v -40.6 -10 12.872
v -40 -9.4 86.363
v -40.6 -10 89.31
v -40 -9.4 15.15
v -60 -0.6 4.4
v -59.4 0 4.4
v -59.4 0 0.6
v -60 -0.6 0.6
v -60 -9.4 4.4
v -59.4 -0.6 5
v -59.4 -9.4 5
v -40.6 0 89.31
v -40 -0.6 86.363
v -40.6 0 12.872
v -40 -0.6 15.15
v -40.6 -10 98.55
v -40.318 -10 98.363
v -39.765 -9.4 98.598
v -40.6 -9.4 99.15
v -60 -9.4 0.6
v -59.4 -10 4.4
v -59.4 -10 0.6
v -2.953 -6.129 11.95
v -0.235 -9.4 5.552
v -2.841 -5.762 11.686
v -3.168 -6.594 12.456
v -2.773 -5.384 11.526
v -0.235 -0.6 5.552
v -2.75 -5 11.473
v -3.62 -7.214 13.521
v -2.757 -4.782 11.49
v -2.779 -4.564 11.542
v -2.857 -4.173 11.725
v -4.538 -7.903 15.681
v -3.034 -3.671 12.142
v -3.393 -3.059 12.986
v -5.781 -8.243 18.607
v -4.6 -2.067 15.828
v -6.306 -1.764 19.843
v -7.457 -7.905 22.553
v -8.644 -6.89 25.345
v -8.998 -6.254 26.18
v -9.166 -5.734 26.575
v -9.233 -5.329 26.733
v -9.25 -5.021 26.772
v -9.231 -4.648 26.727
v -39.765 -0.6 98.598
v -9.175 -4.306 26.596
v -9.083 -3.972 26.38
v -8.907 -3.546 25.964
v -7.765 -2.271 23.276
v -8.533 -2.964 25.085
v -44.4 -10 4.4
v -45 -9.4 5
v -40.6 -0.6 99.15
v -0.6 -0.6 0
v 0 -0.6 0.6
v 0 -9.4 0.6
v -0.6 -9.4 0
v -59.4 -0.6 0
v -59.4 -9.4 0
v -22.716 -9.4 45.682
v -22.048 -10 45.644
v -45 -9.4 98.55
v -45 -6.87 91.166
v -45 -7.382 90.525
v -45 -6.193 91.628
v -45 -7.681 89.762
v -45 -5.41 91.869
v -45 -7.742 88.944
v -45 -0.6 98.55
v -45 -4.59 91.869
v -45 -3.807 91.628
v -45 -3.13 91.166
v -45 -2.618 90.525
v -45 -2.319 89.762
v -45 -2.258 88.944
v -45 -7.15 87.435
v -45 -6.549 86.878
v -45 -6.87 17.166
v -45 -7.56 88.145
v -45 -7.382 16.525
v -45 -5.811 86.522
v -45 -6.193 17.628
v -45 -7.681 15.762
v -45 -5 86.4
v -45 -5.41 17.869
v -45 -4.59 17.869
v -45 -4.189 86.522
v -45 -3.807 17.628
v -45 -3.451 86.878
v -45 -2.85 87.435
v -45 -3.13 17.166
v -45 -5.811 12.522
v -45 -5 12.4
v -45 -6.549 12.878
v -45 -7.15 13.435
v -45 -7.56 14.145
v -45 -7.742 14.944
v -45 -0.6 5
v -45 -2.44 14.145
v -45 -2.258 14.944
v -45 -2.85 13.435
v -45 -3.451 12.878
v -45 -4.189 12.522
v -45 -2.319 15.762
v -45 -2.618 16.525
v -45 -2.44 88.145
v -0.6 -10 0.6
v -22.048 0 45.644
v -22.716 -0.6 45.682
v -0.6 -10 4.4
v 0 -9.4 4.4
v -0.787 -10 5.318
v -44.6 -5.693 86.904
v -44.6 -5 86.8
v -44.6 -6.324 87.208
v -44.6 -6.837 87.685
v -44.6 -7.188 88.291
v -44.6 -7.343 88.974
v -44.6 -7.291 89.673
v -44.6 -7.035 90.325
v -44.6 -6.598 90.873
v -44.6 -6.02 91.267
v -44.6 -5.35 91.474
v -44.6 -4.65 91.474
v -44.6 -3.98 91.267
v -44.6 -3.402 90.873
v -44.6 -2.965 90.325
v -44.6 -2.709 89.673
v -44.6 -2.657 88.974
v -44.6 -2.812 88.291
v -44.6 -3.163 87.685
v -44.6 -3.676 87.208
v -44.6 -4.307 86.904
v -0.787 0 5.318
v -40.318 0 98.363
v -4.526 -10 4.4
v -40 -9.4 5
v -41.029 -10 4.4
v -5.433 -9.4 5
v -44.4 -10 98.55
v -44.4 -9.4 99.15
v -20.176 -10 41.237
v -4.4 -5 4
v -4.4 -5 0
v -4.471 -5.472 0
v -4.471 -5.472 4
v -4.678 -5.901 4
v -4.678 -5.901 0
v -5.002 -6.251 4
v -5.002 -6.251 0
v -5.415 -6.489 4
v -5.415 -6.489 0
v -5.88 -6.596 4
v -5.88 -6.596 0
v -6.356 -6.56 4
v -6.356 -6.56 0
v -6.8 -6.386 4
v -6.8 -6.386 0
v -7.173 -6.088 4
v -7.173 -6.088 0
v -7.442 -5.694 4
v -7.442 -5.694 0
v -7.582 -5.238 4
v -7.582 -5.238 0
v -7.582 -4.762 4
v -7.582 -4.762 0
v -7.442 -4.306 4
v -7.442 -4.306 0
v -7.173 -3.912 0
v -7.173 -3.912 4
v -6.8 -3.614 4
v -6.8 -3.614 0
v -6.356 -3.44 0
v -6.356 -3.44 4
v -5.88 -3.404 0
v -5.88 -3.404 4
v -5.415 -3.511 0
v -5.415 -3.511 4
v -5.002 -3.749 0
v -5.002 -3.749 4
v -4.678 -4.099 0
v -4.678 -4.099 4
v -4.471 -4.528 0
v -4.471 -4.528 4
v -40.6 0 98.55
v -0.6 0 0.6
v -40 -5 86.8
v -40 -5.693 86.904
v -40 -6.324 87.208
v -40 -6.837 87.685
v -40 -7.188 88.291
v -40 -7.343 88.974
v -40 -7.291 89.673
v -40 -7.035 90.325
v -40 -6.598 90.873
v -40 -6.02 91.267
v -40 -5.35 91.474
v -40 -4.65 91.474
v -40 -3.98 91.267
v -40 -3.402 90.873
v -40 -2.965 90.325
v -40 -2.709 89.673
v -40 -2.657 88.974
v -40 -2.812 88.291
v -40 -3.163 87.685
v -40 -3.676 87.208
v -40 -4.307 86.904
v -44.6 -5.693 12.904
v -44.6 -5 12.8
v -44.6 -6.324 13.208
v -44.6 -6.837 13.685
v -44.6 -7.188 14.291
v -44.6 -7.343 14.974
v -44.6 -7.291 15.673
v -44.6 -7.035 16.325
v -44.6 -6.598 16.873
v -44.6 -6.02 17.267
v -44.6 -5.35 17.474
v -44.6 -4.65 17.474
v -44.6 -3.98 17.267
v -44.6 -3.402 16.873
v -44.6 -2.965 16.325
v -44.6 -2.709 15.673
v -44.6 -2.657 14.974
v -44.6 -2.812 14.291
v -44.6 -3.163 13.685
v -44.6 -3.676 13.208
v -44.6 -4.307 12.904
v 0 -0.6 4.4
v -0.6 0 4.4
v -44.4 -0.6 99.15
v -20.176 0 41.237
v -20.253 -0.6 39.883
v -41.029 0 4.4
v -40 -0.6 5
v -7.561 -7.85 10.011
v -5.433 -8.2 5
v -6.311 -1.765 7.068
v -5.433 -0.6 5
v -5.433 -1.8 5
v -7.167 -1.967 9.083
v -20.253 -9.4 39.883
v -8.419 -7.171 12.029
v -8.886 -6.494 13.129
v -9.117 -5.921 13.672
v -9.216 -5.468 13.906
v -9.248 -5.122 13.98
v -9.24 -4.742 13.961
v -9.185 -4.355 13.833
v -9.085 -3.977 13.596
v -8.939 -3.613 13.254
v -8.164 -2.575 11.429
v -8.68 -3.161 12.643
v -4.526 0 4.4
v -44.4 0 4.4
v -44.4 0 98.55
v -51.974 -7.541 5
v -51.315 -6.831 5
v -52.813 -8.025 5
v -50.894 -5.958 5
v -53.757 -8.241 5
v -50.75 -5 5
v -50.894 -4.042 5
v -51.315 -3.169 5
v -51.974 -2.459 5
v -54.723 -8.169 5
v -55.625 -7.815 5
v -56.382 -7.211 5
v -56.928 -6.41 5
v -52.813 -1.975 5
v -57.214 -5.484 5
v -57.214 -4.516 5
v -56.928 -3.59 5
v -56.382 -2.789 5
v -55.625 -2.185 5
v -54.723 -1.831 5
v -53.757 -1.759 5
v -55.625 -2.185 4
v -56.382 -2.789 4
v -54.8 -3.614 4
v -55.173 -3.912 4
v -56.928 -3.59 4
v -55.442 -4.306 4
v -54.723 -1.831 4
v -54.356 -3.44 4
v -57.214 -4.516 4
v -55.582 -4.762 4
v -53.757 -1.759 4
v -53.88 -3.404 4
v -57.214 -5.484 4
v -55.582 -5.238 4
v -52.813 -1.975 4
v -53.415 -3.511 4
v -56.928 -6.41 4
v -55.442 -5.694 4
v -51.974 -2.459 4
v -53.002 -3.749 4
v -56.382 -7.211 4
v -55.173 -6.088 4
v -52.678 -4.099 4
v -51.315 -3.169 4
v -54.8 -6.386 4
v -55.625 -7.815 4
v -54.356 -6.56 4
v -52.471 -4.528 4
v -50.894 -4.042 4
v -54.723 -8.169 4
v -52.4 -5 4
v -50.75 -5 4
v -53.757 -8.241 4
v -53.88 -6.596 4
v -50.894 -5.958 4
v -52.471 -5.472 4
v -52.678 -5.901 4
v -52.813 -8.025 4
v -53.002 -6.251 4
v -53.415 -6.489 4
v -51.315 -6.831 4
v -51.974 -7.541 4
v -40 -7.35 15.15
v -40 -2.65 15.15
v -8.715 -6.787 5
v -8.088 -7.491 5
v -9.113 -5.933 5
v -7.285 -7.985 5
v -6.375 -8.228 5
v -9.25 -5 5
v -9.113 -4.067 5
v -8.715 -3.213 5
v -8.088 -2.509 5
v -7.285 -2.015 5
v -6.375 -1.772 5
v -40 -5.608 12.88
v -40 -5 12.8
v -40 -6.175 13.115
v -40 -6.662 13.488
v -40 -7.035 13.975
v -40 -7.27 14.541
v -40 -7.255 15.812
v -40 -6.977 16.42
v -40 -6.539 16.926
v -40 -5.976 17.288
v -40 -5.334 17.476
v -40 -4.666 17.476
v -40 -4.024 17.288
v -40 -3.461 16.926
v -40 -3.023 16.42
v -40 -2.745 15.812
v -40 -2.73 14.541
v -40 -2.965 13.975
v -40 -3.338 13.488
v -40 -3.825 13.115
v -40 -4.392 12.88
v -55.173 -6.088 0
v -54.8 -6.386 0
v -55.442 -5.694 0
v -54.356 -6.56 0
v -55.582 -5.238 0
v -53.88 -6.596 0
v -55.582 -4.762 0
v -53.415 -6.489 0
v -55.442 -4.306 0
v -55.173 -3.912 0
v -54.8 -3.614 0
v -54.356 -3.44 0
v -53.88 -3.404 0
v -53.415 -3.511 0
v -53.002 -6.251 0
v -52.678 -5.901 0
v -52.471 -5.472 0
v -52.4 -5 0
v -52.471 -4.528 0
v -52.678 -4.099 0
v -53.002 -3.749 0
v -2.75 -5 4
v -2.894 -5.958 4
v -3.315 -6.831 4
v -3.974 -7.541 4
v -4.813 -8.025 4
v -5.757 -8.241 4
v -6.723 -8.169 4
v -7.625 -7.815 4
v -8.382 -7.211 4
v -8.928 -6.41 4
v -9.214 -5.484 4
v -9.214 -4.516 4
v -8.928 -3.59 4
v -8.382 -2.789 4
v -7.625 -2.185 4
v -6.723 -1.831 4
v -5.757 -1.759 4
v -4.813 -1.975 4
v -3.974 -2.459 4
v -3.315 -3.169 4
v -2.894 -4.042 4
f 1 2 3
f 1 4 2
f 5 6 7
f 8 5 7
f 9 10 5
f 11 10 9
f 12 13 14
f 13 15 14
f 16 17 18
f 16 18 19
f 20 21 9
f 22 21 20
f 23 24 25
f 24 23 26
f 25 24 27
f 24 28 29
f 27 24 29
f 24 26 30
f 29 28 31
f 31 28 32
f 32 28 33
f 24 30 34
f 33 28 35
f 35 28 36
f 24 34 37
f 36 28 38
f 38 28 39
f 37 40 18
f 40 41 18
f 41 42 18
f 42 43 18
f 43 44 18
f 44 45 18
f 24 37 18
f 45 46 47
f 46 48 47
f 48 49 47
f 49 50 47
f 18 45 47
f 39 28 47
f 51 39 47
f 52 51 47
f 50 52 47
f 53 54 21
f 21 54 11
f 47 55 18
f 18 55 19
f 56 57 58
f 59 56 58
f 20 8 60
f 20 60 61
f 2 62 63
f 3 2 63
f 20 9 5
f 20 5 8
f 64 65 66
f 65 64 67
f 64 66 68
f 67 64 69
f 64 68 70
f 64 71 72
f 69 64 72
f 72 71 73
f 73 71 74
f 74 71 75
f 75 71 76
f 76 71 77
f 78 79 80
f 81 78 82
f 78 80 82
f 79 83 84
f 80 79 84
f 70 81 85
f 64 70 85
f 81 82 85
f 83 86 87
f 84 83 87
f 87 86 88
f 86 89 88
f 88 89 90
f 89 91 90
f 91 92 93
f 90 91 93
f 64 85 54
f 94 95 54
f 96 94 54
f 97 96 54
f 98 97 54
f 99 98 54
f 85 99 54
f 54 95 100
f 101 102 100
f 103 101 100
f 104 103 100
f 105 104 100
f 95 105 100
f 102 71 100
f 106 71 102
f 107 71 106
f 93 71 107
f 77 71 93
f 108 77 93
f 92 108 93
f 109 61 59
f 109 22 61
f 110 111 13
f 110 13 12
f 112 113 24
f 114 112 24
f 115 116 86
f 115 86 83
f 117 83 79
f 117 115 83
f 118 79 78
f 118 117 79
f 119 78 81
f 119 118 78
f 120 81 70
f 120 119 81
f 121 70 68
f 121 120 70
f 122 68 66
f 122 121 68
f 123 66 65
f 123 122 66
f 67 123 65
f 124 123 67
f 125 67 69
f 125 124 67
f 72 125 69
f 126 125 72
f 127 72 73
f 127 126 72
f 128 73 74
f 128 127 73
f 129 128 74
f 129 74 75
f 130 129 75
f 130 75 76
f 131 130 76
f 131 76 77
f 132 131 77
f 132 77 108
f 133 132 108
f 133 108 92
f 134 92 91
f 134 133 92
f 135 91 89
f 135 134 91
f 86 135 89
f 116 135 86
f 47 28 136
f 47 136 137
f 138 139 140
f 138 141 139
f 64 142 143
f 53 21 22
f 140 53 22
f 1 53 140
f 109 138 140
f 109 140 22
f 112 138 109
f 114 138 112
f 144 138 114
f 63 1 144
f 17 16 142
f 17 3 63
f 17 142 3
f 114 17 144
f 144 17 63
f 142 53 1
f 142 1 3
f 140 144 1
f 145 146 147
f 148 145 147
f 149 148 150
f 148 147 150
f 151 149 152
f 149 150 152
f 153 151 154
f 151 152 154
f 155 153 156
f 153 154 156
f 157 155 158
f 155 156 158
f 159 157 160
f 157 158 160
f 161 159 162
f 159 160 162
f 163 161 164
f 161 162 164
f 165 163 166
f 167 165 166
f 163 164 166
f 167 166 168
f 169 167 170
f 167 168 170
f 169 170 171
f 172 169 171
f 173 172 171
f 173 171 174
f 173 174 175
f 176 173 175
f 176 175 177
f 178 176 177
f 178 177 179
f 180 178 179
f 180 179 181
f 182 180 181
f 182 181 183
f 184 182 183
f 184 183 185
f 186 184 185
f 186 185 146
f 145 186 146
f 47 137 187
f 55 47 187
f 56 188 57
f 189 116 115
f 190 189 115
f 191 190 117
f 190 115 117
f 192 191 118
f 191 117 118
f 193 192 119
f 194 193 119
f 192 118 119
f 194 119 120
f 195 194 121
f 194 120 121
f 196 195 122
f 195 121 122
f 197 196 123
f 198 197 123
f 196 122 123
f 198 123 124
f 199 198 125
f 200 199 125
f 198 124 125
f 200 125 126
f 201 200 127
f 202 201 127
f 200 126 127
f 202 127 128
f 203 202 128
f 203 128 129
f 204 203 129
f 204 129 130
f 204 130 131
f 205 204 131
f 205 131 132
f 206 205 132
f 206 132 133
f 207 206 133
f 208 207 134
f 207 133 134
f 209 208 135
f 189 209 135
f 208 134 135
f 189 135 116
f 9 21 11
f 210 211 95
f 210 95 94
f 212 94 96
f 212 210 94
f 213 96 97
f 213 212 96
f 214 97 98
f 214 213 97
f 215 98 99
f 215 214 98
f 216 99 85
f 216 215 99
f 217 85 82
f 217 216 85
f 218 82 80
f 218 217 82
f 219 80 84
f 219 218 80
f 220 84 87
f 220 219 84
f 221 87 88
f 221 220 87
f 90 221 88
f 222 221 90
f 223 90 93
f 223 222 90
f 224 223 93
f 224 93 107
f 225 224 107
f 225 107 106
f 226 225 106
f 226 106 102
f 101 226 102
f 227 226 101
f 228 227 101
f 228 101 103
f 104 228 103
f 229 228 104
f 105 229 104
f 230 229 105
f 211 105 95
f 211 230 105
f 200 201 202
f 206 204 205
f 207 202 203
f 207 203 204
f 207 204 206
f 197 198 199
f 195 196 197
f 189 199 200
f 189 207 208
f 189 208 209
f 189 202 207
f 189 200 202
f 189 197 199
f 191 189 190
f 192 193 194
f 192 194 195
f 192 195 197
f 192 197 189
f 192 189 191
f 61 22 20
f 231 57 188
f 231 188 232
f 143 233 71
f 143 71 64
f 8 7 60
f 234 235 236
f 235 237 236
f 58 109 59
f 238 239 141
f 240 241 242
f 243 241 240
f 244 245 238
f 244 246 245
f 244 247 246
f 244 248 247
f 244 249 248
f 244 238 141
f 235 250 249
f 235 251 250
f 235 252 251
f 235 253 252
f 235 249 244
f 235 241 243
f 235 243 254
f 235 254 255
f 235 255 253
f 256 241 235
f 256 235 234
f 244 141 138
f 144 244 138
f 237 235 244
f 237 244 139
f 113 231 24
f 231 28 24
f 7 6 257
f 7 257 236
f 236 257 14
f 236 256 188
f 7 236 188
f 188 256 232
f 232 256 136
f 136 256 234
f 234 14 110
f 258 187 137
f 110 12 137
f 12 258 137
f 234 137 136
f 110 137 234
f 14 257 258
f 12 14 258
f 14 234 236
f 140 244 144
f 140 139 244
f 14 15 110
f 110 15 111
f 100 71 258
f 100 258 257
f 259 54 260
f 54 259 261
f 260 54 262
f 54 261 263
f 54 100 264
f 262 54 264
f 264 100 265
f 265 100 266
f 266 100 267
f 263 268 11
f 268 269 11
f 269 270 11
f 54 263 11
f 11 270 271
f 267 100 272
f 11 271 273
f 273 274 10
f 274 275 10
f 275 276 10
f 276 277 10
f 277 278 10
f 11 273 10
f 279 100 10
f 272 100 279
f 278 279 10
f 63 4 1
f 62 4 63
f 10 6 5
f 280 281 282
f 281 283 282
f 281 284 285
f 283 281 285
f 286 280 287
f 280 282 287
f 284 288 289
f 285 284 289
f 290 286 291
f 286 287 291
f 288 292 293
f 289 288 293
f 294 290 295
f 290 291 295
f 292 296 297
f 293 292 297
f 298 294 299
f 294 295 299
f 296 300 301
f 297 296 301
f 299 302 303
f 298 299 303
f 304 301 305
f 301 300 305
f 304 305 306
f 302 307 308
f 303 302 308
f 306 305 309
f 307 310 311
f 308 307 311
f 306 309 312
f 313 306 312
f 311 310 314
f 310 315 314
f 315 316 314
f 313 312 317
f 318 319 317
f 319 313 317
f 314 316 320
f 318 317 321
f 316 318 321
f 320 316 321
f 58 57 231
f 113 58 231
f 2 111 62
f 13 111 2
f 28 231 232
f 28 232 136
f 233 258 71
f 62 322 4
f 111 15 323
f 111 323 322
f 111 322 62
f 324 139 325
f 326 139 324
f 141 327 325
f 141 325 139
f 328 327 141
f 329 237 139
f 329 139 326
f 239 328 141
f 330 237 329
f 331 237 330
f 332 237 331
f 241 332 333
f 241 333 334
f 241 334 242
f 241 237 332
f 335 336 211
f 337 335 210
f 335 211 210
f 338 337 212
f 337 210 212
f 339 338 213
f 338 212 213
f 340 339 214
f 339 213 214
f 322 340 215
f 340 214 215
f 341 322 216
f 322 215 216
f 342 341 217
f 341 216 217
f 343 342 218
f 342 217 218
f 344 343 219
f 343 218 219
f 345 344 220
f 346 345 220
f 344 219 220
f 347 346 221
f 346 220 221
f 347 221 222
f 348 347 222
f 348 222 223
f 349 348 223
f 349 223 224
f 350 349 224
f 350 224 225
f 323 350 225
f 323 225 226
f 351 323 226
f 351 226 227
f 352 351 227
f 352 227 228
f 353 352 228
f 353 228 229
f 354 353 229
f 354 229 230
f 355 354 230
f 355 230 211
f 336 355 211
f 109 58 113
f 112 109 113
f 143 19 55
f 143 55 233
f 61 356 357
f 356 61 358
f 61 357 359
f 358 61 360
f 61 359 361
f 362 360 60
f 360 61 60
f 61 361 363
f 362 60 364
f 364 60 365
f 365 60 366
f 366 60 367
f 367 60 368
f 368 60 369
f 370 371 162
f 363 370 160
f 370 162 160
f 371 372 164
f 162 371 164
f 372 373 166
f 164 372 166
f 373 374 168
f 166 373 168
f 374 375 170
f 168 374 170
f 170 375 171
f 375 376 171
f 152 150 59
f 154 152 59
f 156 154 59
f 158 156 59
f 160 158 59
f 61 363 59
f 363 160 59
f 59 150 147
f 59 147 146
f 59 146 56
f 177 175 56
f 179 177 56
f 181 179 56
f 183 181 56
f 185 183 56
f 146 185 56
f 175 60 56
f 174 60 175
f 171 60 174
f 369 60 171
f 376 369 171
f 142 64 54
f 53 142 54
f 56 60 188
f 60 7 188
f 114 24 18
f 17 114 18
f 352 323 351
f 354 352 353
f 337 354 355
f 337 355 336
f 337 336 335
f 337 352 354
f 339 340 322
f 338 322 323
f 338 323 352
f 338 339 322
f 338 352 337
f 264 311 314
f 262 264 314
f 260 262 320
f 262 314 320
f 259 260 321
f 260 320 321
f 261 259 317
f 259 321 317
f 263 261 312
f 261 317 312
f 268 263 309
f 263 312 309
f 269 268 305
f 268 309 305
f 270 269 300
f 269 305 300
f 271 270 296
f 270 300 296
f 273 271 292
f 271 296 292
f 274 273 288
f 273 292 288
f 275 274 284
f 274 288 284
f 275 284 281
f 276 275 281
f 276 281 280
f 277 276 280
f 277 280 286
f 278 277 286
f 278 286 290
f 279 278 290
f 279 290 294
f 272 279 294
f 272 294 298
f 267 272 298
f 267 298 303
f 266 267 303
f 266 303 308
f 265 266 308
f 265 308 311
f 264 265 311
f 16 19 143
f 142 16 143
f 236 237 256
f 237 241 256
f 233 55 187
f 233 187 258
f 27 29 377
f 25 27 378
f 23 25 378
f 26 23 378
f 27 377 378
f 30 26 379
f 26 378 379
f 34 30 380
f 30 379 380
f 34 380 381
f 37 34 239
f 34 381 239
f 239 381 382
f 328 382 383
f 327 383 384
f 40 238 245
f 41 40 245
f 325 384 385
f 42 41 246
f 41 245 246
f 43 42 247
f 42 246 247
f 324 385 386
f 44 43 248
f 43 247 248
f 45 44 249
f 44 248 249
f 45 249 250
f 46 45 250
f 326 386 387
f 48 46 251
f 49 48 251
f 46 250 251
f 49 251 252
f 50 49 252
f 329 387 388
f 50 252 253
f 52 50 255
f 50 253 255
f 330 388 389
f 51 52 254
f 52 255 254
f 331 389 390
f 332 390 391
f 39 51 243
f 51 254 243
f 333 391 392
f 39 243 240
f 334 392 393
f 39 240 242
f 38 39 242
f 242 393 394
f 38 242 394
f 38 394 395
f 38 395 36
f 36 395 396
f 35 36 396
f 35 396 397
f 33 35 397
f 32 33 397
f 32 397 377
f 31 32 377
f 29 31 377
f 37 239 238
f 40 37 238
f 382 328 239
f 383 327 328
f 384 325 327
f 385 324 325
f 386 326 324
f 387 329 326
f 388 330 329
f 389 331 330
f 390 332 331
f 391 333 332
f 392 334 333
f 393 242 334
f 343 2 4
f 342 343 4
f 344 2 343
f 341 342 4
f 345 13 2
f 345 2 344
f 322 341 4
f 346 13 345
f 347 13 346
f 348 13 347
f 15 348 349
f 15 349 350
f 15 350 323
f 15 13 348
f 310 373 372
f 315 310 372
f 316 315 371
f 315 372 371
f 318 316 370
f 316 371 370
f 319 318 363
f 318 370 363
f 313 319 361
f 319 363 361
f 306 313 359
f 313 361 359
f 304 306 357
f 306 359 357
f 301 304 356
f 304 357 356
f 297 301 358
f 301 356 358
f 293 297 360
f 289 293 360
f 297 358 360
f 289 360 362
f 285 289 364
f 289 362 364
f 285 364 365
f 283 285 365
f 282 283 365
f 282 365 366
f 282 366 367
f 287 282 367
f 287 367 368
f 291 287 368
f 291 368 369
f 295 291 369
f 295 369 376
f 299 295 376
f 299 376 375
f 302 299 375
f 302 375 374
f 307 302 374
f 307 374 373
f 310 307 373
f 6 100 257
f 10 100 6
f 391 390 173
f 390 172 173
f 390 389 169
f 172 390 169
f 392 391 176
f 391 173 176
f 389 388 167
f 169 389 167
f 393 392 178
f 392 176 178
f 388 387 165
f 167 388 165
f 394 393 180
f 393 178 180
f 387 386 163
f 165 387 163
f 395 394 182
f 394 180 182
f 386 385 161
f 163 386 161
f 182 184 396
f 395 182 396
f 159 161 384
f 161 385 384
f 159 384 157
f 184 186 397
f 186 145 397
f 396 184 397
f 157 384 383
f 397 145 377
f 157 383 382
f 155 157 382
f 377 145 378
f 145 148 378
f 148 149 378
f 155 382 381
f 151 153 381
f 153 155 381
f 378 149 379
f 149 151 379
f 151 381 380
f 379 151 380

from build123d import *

# Parameters (mm, degrees)
PAD009_DEPTH    = 10
SKETCH021_R     = 2.35
POCKET008_DEPTH = 5
SKETCH022_R     = 1.6
POCKET009_DEPTH = 99.151
SKETCH023_R     = 3.25
POCKET010_DEPTH = 95.151
CHAMFER007_SIZE = 0.6
CHAMFER008_SIZE = 0.4


with BuildPart() as part:
    # Sketch020 → Pad009 (new body)
    with BuildSketch(Plane.XZ):
        Polygon((-60, 0), (0, 0), (0, 5), (-40, 99.15), (-45, 99.15), (-45, 5), (-60, 5), align=None)
        Polygon((-40, 5), (-5.4325428768, 5), (-20.2529345059, 39.8834967971), align=None, mode=Mode.SUBTRACT)
        Polygon((-40, 15.1496021181), (-22.7162714384, 45.6815761019), (-40, 86.3631522038), align=None, mode=Mode.SUBTRACT)
    extrude(amount=PAD009_DEPTH)

    # Sketch021 (on Face5 of Pad009) → Pocket008 (cut)
    with BuildSketch(Plane(origin=(-45, 0, 0), x_dir=(0, 0, -1), z_dir=(-1, 0, 0))):
        with Locations((-89.15, 5)):
            Circle(SKETCH021_R)
        with Locations((-15.15, 5)):
            Circle(SKETCH021_R)
    extrude(amount=-POCKET008_DEPTH, mode=Mode.SUBTRACT)

    # Sketch022 (on Face1 of Pocket008) → Pocket009 (cut, through all)
    with BuildSketch(Plane(origin=(0, 0, 0), x_dir=(1, 0, 0), z_dir=(0, 0, -1))):
        with Locations((-54, 5)):
            Circle(SKETCH022_R)
        with Locations((-6, 5)):
            Circle(SKETCH022_R)
    extrude(amount=-POCKET009_DEPTH, mode=Mode.SUBTRACT)

    # Sketch023 (on Sketch) → Pocket010 (cut, through all)
    with BuildSketch(Plane(origin=(0, 0, 4), x_dir=(1, 0, 0), z_dir=(0, 0, -1))):
        with Locations((-54, 5)):
            Circle(SKETCH023_R)
        with Locations((-6, 5)):
            Circle(SKETCH023_R)
    extrude(amount=-POCKET010_DEPTH, mode=Mode.SUBTRACT)

    # Chamfer007
    chamfer007_edges = [part.edges().sort_by_distance(p)[0] for p in [
        (-30, 0, 0),
        (0, 0, 2.5),
        (-20, 0, 52.075),
        (-42.5, 0, 99.15),
        (-45, 0, 52.075),
        (-52.5, 0, 5),
        (-60, 0, 2.5),
        (-31.358136, 0, 30.415589),
        (-31.358136, 0, 66.022364),
        (-40, 0, 50.756377),
        (-22.716271, 0, 5),
        (-12.842739, 0, 22.441748),
        (-30.126467, 0, 22.441748),
        (-30, -10, 0),
        (0, -10, 2.5),
        (-20, -10, 52.075),
        (-42.5, -10, 99.15),
        (-45, -10, 52.075),
        (-52.5, -10, 5),
        (-60, -10, 2.5),
        (-31.358136, -10, 30.415589),
        (-31.358136, -10, 66.022364),
        (-40, -10, 50.756377),
        (-22.716271, -10, 5),
        (-12.842739, -10, 22.441748),
        (-30.126467, -10, 22.441748),
        (-40, -5, 99.15),
        (-45, -5, 99.15),
        (-60, -5, 5),
        (-60, -5, 0),
        (0, -5, 0),
        (0, -5, 5),
    ]]
    chamfer(chamfer007_edges, length=CHAMFER007_SIZE)

    # Chamfer008
    chamfer008_edges = [part.edges().sort_by_distance(p)[0] for p in [
        (-45, -5, 91.5),
        (-45, -5, 17.5),
    ]]
    chamfer(chamfer008_edges, length=CHAMFER008_SIZE)


solid = part.part
